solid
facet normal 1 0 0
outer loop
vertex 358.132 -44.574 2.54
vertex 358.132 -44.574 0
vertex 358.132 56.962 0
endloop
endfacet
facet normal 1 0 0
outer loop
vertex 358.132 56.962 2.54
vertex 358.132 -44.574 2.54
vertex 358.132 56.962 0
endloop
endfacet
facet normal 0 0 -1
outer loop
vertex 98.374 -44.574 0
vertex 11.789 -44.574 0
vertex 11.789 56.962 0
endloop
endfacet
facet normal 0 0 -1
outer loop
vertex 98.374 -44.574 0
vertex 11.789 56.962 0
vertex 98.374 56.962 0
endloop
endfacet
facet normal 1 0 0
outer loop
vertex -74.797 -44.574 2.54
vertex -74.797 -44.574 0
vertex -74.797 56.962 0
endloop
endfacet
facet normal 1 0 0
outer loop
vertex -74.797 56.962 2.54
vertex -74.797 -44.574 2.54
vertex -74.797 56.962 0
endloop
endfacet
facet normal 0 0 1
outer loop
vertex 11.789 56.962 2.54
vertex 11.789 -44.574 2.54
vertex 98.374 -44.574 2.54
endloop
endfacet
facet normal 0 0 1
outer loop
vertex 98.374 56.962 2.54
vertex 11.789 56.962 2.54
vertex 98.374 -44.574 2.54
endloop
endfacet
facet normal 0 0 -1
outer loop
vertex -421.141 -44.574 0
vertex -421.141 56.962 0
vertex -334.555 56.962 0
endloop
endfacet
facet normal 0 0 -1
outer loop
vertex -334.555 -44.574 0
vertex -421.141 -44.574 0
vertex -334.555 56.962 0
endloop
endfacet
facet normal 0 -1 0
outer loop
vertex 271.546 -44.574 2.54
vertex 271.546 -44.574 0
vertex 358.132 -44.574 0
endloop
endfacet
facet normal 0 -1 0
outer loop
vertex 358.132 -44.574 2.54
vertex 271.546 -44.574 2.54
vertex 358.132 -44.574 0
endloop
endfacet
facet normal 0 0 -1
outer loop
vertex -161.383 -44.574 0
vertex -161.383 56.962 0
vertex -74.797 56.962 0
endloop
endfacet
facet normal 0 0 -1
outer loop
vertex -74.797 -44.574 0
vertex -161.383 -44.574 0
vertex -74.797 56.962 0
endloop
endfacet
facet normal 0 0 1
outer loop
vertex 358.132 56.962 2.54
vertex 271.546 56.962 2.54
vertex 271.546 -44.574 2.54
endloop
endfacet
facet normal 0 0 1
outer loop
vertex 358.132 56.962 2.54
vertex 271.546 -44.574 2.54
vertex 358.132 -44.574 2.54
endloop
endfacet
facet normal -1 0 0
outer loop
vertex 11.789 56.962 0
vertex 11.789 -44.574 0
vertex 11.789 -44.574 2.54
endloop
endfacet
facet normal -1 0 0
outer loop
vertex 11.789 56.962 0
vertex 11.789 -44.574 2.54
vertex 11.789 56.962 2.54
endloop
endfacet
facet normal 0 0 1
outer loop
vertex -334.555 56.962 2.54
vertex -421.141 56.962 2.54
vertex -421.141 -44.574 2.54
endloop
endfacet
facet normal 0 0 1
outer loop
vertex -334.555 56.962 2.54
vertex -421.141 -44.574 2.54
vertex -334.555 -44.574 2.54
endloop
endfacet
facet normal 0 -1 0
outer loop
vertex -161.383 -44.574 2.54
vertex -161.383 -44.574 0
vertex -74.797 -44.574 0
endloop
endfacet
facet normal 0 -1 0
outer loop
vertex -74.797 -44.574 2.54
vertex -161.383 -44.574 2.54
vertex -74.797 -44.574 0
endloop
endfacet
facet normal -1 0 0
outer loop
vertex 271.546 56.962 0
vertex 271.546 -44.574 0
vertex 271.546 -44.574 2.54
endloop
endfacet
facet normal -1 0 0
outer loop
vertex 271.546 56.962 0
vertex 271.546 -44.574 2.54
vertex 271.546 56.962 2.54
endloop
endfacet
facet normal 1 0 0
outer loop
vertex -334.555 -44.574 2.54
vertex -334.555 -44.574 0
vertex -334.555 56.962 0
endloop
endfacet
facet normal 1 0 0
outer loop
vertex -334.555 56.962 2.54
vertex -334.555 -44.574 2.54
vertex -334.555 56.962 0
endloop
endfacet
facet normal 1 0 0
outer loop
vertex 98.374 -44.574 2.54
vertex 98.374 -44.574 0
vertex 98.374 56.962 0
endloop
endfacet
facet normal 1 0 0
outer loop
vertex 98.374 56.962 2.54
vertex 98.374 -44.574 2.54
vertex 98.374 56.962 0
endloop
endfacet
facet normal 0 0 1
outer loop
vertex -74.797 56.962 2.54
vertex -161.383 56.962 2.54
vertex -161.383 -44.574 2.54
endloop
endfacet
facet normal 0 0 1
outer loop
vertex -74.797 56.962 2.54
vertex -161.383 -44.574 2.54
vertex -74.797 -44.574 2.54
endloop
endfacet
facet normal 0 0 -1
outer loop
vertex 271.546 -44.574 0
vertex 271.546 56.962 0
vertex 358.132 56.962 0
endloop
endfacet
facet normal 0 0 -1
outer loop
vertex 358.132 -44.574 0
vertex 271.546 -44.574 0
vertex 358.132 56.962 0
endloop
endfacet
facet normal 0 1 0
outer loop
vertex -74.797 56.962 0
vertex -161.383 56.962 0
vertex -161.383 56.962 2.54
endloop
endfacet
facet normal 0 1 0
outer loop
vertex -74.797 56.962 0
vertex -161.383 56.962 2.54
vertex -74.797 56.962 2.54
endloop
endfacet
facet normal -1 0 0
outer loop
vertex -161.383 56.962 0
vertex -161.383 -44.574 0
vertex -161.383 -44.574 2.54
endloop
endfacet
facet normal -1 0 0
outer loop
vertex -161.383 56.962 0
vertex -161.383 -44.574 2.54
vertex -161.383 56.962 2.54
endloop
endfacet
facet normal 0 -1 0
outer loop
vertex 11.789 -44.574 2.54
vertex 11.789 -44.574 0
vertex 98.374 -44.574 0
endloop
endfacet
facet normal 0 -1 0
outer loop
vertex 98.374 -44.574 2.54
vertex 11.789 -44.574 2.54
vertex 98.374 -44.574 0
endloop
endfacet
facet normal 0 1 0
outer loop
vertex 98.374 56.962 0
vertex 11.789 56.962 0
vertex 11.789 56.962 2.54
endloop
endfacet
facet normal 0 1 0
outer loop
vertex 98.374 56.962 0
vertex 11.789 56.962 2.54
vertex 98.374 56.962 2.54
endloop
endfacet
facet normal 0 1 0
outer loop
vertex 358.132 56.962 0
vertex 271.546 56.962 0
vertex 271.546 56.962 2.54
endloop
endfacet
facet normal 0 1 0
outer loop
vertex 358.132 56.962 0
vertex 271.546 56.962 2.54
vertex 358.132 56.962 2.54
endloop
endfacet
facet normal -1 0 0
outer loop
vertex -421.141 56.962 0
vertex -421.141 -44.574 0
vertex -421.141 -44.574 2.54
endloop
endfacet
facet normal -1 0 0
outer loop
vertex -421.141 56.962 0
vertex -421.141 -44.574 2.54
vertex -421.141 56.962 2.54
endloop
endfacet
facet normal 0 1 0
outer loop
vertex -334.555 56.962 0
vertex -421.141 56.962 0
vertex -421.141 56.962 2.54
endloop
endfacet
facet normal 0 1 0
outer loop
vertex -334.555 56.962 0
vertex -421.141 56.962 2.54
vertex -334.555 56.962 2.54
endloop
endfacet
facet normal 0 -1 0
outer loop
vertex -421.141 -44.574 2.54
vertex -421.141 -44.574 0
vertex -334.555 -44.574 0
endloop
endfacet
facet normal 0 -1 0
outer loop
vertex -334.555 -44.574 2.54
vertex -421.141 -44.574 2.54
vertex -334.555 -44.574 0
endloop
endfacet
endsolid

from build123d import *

# Parameters (mm, degrees)
F0_W     = 86.585903
F0_H     = 101.535976
F1_DEPTH = 2.54
F2_DEPTH = 2.54
F3_DEPTH = 2.54
F0_W_2   = 86.585904
F4_DEPTH = 2.54


with BuildPart() as f1:
    # F0 (on Top) → F1 (new body)
    with BuildSketch(Plane.XY):
        with Locations((-377.847972, 6.193966)):
            Rectangle(F0_W, F0_H)
    extrude(amount=F1_DEPTH)


with BuildPart() as f2:
    # F0 (on Top) → F2 (new body)
    with BuildSketch(Plane.XY):
        with Locations((-118.090261, 6.193966)):
            Rectangle(F0_W, F0_H)
    extrude(amount=F2_DEPTH)


with BuildPart() as f3:
    # F0 (on Top) → F3 (new body)
    with BuildSketch(Plane.XY):
        with Locations((55.081545, 6.193966)):
            Rectangle(F0_W, F0_H)
    extrude(amount=F3_DEPTH)


with BuildPart() as f4:
    # F0 (on Top) → F4 (new body)
    with BuildSketch(Plane.XY):
        with Locations((314.839256, 6.193966)):
            Rectangle(F0_W_2, F0_H)
    extrude(amount=F4_DEPTH)


solid = Compound([f1.part, f2.part, f3.part, f4.part])
